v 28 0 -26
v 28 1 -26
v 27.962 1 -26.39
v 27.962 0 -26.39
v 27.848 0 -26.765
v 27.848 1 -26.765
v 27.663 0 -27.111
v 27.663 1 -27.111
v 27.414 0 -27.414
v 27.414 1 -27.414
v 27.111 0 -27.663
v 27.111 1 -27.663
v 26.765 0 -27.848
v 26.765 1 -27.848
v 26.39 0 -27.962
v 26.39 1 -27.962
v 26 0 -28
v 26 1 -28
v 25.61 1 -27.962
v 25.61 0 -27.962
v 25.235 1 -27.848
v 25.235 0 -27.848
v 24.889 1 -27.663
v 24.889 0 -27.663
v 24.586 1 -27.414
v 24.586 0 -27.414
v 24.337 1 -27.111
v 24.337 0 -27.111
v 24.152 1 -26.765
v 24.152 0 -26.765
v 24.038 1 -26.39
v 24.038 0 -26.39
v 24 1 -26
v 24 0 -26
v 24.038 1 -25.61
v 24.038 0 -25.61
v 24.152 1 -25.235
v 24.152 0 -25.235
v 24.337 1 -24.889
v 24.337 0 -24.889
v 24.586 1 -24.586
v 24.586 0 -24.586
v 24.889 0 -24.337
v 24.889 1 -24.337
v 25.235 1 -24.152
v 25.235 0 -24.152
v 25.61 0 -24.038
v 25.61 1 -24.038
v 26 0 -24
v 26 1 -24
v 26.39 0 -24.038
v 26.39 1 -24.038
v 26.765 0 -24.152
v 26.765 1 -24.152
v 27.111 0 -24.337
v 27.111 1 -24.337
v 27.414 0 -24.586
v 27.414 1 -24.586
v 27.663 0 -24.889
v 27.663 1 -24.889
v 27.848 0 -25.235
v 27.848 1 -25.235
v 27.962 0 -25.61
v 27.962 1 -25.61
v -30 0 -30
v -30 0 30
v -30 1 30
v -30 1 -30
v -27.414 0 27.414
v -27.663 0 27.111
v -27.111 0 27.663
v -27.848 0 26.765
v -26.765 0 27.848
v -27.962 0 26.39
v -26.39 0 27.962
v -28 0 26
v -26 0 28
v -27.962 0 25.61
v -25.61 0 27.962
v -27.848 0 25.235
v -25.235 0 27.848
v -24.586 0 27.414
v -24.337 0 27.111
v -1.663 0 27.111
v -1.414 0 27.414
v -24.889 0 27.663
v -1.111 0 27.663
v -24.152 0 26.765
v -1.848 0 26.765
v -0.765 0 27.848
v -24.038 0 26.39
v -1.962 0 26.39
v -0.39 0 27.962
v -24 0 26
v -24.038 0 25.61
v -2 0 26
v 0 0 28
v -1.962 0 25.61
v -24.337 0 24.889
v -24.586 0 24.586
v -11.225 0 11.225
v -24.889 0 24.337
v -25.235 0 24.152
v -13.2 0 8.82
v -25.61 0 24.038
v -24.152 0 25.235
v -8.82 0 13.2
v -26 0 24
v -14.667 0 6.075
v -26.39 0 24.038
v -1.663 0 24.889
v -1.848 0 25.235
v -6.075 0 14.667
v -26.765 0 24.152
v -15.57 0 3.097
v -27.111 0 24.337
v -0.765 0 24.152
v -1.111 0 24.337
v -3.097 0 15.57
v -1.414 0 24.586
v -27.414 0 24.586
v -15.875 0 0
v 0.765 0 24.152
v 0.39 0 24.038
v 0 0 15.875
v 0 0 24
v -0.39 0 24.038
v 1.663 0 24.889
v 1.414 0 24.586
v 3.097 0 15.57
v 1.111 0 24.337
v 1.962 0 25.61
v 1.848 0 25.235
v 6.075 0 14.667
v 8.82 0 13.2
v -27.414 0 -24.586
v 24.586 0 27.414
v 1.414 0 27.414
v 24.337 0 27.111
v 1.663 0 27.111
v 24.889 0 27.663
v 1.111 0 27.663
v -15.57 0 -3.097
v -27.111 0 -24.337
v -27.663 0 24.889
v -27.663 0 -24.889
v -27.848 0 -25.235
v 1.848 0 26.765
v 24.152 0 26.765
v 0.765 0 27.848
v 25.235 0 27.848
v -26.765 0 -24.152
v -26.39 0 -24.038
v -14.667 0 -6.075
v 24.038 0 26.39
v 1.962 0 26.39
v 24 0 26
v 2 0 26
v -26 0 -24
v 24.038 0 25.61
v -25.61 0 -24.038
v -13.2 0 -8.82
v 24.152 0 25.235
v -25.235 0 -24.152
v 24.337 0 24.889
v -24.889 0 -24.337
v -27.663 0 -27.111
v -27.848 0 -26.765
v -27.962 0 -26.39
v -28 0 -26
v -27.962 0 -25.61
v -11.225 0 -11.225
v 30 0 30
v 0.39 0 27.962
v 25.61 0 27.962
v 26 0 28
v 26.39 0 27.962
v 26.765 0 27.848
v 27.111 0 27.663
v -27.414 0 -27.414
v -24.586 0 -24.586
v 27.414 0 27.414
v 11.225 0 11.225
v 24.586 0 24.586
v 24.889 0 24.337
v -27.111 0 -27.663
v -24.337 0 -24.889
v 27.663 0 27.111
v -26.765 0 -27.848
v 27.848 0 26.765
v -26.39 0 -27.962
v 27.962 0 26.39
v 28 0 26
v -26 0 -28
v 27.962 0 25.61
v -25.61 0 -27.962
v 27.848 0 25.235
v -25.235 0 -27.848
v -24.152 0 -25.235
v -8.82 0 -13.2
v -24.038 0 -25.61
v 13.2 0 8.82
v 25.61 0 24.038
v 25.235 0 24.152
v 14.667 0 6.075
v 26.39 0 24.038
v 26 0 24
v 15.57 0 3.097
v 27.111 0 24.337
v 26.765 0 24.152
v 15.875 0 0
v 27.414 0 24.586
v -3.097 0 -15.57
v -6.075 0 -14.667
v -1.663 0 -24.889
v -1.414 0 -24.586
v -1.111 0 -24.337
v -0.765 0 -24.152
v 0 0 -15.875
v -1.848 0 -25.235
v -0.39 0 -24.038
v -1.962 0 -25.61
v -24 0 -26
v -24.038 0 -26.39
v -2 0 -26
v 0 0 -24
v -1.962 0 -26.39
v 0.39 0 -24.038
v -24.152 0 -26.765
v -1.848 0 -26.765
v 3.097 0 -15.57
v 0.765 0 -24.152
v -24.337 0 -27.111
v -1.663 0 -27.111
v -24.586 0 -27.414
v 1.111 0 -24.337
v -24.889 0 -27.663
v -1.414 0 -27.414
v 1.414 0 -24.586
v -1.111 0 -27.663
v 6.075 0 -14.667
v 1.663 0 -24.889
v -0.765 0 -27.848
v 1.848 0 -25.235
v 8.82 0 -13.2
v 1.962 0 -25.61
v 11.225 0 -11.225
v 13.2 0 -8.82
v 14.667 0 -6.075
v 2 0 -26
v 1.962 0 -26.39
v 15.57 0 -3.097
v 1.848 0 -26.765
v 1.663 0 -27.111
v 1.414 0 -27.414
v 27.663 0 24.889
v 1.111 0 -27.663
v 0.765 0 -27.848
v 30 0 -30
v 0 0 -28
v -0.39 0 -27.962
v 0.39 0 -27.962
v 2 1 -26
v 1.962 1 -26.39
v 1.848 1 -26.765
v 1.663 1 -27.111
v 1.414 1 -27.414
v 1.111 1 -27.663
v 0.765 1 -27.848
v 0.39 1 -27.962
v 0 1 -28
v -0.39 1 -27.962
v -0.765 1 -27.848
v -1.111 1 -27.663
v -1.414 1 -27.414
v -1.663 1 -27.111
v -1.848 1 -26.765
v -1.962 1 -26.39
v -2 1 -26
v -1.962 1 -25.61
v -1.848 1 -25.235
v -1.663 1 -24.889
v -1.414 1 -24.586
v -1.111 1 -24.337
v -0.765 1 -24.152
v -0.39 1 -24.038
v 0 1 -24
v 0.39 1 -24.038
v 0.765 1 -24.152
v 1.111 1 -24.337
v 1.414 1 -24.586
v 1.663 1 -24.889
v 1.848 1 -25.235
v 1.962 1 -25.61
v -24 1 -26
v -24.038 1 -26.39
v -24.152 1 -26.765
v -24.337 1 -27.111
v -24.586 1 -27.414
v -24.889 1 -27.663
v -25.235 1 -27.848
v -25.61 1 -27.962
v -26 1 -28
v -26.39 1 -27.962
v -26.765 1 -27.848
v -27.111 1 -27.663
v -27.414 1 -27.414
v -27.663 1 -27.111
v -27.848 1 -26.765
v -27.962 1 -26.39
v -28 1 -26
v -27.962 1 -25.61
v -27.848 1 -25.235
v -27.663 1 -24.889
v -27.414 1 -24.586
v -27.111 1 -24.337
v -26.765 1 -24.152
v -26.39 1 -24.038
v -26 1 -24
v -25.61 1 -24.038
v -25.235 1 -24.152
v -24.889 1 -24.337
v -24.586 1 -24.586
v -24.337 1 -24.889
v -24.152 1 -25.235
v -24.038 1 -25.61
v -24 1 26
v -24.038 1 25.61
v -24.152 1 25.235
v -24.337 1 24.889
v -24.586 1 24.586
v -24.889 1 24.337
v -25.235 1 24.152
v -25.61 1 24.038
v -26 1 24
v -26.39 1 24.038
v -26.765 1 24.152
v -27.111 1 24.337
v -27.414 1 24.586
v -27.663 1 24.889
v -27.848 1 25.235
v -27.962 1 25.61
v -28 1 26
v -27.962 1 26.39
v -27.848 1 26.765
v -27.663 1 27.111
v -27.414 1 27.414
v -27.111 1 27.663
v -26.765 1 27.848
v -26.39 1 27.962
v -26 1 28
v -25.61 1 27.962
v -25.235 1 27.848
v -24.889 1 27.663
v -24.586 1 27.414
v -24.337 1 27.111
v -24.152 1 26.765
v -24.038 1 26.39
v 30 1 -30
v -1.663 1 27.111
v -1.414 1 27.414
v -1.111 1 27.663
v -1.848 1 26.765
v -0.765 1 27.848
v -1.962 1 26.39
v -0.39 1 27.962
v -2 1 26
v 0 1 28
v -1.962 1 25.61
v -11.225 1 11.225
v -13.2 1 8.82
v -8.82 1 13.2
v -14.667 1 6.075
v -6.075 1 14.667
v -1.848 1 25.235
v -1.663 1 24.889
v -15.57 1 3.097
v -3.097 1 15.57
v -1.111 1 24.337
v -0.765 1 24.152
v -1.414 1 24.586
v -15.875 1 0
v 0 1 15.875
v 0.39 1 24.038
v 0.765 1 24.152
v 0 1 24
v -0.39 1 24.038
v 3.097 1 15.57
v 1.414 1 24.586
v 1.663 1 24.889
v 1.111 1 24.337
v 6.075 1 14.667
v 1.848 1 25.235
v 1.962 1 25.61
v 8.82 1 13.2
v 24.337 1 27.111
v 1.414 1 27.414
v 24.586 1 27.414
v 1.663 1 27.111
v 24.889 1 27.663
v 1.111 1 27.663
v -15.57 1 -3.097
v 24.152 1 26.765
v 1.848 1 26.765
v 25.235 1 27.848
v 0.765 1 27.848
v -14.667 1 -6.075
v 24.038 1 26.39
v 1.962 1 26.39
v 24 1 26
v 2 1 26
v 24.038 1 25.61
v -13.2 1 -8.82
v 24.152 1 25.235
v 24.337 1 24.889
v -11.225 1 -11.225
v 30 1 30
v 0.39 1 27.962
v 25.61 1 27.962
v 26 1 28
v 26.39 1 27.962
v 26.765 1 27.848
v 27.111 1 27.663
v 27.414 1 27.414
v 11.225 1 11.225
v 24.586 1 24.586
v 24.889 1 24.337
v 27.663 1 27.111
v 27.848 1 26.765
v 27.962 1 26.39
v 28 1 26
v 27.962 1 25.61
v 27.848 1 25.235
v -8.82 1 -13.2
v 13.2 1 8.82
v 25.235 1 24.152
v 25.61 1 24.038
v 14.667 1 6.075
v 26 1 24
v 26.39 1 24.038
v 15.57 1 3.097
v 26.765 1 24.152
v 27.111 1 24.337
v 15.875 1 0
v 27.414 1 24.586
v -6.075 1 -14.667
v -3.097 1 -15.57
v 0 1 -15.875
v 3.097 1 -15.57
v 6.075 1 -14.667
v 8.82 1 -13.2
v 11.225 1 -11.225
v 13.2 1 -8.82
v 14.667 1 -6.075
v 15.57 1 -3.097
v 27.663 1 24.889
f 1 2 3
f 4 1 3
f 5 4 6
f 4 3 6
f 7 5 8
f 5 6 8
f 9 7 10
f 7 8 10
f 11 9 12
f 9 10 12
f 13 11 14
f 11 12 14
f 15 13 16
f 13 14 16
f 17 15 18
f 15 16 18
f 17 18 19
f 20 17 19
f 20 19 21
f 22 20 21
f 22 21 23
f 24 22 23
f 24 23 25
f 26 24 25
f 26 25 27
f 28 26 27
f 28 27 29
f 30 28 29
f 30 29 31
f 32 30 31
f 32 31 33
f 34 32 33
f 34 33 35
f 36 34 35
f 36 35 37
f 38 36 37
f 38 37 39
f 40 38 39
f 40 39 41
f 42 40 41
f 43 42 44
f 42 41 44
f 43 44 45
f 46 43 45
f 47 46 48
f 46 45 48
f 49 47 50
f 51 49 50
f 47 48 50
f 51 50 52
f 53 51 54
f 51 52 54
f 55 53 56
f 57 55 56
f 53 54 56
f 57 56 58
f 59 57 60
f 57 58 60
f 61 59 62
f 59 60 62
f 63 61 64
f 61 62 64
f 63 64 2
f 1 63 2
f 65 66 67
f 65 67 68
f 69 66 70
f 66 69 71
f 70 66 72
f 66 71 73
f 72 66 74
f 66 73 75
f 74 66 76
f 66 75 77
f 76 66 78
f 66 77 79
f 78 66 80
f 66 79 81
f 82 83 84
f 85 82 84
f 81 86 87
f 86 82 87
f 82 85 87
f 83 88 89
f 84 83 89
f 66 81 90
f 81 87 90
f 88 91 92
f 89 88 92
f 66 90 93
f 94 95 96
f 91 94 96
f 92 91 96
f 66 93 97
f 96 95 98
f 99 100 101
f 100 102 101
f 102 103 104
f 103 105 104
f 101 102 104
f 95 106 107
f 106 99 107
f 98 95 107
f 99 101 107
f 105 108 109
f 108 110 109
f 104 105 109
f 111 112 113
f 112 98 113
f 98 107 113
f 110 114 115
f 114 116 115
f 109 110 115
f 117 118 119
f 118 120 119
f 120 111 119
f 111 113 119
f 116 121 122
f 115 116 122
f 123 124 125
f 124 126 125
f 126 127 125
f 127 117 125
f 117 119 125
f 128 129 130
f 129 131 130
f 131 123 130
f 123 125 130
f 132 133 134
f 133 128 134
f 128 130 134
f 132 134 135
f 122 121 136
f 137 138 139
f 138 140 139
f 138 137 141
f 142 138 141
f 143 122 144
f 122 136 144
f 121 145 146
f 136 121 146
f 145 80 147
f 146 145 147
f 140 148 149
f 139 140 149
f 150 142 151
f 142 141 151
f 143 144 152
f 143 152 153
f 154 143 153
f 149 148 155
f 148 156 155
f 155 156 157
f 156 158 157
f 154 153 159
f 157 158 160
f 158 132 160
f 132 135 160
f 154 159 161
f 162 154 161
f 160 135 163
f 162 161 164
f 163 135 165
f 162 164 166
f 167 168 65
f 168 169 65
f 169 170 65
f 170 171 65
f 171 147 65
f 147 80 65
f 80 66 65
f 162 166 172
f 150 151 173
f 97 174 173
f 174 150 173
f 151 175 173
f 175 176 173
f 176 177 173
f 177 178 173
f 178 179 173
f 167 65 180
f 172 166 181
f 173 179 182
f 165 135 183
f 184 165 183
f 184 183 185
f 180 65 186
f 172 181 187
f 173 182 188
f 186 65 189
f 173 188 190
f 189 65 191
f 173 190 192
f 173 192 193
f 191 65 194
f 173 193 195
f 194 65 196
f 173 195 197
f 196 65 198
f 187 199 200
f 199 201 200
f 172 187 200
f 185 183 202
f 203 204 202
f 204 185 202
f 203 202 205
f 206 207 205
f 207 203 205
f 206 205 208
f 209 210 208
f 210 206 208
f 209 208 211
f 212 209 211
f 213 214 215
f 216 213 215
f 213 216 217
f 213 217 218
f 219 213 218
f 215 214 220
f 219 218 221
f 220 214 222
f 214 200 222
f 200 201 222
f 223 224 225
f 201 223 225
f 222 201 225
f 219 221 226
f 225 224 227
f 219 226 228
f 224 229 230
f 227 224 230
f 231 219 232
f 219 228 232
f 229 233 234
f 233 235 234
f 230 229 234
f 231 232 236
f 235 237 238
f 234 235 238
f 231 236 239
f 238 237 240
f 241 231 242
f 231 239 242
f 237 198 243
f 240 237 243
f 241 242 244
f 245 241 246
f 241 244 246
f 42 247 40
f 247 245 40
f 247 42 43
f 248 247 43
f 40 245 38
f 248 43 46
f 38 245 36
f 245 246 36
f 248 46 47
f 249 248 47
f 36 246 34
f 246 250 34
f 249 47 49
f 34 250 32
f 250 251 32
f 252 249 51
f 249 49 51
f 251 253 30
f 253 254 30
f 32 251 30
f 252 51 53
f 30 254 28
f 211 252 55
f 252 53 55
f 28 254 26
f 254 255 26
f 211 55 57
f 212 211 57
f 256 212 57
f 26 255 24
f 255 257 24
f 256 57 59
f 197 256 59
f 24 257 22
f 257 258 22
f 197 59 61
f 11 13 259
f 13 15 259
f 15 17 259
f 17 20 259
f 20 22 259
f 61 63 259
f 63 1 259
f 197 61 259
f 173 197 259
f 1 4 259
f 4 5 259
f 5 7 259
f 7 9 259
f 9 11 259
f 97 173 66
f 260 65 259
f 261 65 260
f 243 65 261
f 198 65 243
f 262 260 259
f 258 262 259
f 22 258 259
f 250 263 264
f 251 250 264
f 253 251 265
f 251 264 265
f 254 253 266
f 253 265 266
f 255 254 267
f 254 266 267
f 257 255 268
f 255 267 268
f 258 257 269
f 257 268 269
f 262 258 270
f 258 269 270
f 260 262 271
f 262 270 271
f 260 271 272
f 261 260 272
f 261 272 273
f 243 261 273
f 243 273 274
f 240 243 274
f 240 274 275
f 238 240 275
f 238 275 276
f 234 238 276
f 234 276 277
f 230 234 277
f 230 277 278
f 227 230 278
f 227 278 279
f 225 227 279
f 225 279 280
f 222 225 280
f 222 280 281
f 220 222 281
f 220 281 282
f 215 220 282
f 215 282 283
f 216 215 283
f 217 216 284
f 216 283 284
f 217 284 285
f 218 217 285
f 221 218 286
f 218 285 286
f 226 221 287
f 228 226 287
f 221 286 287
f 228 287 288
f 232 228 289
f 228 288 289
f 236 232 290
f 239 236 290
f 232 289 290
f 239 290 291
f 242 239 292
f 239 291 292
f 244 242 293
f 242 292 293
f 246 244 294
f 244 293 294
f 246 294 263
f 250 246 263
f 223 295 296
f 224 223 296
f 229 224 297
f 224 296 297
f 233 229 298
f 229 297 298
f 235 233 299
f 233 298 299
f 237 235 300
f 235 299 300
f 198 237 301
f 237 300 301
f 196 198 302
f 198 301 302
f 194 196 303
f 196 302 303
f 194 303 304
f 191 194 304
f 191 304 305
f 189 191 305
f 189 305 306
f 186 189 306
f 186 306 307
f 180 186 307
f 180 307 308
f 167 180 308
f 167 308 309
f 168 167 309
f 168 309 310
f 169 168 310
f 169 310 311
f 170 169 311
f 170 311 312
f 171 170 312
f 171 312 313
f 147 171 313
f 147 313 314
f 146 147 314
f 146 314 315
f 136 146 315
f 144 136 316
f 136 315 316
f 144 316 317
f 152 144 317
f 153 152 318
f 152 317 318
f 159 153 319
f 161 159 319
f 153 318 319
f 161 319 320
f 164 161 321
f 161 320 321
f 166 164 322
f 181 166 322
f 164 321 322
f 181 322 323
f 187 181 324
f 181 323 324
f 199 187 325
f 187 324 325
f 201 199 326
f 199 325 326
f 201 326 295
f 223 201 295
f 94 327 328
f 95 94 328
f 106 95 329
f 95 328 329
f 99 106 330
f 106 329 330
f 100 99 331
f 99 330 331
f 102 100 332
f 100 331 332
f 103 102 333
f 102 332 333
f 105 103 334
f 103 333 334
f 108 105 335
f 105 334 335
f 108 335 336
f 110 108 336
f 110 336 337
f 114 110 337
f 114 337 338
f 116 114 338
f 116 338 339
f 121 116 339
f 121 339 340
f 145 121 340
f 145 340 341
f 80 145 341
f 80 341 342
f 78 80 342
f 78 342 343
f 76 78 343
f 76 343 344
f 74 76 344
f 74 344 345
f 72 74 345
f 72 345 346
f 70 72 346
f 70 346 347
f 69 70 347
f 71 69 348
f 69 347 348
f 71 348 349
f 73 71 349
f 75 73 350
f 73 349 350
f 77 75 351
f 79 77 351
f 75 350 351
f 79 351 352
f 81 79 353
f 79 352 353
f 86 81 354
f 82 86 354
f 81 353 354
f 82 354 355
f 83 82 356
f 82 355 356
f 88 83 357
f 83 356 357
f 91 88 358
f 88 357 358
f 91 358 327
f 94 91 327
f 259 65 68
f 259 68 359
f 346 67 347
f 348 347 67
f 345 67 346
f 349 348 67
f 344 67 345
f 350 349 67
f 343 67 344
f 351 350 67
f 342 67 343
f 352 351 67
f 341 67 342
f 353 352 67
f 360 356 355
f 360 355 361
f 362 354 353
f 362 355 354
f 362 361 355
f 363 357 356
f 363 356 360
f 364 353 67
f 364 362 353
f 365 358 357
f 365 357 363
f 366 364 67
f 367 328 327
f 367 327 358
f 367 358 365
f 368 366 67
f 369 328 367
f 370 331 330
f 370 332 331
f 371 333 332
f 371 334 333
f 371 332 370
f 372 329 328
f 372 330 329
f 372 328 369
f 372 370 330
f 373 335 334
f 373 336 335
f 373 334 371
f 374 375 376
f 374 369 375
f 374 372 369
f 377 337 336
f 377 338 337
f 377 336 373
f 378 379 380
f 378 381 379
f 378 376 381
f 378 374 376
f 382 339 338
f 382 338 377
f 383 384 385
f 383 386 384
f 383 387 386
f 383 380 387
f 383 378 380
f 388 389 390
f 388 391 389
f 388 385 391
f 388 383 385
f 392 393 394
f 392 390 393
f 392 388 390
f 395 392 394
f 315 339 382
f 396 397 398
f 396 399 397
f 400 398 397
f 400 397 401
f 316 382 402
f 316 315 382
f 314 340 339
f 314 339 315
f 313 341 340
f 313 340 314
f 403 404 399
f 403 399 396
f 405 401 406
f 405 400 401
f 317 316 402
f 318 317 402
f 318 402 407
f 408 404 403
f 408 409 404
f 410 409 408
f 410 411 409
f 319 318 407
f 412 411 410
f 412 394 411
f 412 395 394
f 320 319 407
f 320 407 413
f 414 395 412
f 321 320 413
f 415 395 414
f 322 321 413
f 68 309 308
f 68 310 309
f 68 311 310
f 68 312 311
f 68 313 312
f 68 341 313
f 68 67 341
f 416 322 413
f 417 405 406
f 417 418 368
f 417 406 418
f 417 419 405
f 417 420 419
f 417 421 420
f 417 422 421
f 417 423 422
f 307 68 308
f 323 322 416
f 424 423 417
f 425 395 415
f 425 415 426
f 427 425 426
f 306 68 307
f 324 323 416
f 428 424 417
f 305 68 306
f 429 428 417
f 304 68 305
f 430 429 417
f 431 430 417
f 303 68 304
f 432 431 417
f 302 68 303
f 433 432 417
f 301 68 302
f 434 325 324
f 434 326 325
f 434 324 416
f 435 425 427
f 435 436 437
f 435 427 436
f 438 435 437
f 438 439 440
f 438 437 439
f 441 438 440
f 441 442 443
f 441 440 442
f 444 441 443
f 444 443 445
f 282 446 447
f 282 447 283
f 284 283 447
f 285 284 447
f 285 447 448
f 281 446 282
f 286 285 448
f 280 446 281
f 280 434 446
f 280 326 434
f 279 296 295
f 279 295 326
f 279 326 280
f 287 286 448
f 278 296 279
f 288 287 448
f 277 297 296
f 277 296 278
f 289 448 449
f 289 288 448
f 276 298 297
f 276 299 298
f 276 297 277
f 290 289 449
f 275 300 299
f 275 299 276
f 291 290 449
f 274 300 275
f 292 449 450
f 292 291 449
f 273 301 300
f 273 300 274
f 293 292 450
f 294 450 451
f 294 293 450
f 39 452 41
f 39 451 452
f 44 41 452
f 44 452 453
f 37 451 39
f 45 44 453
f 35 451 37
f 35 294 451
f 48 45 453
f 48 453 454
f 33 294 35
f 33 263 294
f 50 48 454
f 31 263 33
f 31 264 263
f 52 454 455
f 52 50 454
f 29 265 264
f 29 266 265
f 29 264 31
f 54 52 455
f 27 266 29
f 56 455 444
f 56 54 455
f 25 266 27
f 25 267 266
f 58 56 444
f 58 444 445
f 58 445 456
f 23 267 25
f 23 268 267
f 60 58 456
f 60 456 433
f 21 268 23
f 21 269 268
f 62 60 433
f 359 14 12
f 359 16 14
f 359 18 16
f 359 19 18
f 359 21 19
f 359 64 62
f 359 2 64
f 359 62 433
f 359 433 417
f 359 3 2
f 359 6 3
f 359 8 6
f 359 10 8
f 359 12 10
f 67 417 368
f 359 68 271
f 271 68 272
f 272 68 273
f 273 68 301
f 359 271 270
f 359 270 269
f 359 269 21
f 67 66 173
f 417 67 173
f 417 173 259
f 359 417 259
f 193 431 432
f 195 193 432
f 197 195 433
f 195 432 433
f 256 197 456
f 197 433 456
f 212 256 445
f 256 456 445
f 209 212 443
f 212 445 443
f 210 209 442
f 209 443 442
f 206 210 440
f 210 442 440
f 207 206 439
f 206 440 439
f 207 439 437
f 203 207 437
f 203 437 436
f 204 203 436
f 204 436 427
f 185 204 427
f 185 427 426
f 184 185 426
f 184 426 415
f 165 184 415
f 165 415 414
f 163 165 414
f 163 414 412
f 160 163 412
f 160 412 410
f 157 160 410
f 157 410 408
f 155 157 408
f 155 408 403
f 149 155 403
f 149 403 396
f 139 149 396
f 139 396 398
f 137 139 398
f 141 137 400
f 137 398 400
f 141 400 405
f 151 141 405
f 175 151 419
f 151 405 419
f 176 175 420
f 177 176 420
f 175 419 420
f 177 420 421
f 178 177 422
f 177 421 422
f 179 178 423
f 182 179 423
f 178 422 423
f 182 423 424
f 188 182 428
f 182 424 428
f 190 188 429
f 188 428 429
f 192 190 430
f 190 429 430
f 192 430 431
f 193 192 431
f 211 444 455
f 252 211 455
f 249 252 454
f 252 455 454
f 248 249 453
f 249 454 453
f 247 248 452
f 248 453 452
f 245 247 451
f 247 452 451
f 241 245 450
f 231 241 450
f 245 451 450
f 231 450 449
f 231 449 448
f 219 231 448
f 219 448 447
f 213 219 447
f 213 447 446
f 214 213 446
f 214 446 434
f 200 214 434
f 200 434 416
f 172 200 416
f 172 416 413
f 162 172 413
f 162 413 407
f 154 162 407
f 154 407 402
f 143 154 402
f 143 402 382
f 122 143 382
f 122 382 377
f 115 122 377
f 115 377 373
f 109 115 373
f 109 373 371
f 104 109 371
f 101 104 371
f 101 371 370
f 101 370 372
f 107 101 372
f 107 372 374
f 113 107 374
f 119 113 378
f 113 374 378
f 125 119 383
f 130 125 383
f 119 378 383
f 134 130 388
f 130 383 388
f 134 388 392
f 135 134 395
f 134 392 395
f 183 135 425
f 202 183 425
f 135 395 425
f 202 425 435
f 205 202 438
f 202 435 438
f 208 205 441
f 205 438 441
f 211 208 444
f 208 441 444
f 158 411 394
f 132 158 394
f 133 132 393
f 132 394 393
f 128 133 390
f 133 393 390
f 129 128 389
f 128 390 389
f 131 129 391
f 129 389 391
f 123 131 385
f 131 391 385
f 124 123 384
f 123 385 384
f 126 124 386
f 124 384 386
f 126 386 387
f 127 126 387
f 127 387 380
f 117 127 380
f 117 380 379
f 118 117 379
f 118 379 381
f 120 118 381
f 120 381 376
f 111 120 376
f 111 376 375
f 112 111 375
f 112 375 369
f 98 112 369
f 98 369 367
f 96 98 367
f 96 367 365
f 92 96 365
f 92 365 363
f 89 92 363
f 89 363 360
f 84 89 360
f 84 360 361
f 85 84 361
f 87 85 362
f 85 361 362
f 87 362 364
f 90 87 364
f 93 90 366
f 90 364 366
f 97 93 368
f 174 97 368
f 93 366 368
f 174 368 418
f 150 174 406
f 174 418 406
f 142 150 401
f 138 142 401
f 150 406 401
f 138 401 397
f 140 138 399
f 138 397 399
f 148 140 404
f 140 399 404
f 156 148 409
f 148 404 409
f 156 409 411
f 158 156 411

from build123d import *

# Parameters (mm, degrees)
SKETCH1_W           = 60
SKETCH1_H           = 60
BOSS_EXTRUDE1_DEPTH = 1
SKETCH2_R           = 2
CUT_EXTRUDE1_DEPTH  = 2
SKETCH4_R           = 15.875
CUT_EXTRUDE3_DEPTH  = 10


with BuildPart() as part:
    # Sketch1 → Boss-Extrude1 (new body)
    with BuildSketch(Plane(origin=(0, 0, 0), x_dir=(1, 0, 0), z_dir=(0, 1, 0))):
        Rectangle(SKETCH1_W, SKETCH1_H)
    extrude(amount=BOSS_EXTRUDE1_DEPTH)

    # Sketch2 → Cut-Extrude1 (cut, through all)
    with BuildSketch(Plane(origin=(0, 1, 0), x_dir=(1, 0, 0), z_dir=(0, 1, 0))):
        with Locations((-26, 26)):
            Circle(SKETCH2_R)
        with Locations((0, 26)):
            Circle(SKETCH2_R)
        with Locations((26, 26)):
            Circle(SKETCH2_R)
        with Locations((26, -26)):
            Circle(SKETCH2_R)
        with Locations((0, -26)):
            Circle(SKETCH2_R)
        with Locations((-26, -26)):
            Circle(SKETCH2_R)
    extrude(amount=-CUT_EXTRUDE1_DEPTH, mode=Mode.SUBTRACT)

    # Sketch4 → Cut-Extrude3 (cut)
    with BuildSketch(Plane(origin=(0, 1, 0), x_dir=(1, 0, 0), z_dir=(0, 1, 0))):
        Circle(SKETCH4_R)
    extrude(amount=-CUT_EXTRUDE3_DEPTH, mode=Mode.SUBTRACT)


solid = part.part
